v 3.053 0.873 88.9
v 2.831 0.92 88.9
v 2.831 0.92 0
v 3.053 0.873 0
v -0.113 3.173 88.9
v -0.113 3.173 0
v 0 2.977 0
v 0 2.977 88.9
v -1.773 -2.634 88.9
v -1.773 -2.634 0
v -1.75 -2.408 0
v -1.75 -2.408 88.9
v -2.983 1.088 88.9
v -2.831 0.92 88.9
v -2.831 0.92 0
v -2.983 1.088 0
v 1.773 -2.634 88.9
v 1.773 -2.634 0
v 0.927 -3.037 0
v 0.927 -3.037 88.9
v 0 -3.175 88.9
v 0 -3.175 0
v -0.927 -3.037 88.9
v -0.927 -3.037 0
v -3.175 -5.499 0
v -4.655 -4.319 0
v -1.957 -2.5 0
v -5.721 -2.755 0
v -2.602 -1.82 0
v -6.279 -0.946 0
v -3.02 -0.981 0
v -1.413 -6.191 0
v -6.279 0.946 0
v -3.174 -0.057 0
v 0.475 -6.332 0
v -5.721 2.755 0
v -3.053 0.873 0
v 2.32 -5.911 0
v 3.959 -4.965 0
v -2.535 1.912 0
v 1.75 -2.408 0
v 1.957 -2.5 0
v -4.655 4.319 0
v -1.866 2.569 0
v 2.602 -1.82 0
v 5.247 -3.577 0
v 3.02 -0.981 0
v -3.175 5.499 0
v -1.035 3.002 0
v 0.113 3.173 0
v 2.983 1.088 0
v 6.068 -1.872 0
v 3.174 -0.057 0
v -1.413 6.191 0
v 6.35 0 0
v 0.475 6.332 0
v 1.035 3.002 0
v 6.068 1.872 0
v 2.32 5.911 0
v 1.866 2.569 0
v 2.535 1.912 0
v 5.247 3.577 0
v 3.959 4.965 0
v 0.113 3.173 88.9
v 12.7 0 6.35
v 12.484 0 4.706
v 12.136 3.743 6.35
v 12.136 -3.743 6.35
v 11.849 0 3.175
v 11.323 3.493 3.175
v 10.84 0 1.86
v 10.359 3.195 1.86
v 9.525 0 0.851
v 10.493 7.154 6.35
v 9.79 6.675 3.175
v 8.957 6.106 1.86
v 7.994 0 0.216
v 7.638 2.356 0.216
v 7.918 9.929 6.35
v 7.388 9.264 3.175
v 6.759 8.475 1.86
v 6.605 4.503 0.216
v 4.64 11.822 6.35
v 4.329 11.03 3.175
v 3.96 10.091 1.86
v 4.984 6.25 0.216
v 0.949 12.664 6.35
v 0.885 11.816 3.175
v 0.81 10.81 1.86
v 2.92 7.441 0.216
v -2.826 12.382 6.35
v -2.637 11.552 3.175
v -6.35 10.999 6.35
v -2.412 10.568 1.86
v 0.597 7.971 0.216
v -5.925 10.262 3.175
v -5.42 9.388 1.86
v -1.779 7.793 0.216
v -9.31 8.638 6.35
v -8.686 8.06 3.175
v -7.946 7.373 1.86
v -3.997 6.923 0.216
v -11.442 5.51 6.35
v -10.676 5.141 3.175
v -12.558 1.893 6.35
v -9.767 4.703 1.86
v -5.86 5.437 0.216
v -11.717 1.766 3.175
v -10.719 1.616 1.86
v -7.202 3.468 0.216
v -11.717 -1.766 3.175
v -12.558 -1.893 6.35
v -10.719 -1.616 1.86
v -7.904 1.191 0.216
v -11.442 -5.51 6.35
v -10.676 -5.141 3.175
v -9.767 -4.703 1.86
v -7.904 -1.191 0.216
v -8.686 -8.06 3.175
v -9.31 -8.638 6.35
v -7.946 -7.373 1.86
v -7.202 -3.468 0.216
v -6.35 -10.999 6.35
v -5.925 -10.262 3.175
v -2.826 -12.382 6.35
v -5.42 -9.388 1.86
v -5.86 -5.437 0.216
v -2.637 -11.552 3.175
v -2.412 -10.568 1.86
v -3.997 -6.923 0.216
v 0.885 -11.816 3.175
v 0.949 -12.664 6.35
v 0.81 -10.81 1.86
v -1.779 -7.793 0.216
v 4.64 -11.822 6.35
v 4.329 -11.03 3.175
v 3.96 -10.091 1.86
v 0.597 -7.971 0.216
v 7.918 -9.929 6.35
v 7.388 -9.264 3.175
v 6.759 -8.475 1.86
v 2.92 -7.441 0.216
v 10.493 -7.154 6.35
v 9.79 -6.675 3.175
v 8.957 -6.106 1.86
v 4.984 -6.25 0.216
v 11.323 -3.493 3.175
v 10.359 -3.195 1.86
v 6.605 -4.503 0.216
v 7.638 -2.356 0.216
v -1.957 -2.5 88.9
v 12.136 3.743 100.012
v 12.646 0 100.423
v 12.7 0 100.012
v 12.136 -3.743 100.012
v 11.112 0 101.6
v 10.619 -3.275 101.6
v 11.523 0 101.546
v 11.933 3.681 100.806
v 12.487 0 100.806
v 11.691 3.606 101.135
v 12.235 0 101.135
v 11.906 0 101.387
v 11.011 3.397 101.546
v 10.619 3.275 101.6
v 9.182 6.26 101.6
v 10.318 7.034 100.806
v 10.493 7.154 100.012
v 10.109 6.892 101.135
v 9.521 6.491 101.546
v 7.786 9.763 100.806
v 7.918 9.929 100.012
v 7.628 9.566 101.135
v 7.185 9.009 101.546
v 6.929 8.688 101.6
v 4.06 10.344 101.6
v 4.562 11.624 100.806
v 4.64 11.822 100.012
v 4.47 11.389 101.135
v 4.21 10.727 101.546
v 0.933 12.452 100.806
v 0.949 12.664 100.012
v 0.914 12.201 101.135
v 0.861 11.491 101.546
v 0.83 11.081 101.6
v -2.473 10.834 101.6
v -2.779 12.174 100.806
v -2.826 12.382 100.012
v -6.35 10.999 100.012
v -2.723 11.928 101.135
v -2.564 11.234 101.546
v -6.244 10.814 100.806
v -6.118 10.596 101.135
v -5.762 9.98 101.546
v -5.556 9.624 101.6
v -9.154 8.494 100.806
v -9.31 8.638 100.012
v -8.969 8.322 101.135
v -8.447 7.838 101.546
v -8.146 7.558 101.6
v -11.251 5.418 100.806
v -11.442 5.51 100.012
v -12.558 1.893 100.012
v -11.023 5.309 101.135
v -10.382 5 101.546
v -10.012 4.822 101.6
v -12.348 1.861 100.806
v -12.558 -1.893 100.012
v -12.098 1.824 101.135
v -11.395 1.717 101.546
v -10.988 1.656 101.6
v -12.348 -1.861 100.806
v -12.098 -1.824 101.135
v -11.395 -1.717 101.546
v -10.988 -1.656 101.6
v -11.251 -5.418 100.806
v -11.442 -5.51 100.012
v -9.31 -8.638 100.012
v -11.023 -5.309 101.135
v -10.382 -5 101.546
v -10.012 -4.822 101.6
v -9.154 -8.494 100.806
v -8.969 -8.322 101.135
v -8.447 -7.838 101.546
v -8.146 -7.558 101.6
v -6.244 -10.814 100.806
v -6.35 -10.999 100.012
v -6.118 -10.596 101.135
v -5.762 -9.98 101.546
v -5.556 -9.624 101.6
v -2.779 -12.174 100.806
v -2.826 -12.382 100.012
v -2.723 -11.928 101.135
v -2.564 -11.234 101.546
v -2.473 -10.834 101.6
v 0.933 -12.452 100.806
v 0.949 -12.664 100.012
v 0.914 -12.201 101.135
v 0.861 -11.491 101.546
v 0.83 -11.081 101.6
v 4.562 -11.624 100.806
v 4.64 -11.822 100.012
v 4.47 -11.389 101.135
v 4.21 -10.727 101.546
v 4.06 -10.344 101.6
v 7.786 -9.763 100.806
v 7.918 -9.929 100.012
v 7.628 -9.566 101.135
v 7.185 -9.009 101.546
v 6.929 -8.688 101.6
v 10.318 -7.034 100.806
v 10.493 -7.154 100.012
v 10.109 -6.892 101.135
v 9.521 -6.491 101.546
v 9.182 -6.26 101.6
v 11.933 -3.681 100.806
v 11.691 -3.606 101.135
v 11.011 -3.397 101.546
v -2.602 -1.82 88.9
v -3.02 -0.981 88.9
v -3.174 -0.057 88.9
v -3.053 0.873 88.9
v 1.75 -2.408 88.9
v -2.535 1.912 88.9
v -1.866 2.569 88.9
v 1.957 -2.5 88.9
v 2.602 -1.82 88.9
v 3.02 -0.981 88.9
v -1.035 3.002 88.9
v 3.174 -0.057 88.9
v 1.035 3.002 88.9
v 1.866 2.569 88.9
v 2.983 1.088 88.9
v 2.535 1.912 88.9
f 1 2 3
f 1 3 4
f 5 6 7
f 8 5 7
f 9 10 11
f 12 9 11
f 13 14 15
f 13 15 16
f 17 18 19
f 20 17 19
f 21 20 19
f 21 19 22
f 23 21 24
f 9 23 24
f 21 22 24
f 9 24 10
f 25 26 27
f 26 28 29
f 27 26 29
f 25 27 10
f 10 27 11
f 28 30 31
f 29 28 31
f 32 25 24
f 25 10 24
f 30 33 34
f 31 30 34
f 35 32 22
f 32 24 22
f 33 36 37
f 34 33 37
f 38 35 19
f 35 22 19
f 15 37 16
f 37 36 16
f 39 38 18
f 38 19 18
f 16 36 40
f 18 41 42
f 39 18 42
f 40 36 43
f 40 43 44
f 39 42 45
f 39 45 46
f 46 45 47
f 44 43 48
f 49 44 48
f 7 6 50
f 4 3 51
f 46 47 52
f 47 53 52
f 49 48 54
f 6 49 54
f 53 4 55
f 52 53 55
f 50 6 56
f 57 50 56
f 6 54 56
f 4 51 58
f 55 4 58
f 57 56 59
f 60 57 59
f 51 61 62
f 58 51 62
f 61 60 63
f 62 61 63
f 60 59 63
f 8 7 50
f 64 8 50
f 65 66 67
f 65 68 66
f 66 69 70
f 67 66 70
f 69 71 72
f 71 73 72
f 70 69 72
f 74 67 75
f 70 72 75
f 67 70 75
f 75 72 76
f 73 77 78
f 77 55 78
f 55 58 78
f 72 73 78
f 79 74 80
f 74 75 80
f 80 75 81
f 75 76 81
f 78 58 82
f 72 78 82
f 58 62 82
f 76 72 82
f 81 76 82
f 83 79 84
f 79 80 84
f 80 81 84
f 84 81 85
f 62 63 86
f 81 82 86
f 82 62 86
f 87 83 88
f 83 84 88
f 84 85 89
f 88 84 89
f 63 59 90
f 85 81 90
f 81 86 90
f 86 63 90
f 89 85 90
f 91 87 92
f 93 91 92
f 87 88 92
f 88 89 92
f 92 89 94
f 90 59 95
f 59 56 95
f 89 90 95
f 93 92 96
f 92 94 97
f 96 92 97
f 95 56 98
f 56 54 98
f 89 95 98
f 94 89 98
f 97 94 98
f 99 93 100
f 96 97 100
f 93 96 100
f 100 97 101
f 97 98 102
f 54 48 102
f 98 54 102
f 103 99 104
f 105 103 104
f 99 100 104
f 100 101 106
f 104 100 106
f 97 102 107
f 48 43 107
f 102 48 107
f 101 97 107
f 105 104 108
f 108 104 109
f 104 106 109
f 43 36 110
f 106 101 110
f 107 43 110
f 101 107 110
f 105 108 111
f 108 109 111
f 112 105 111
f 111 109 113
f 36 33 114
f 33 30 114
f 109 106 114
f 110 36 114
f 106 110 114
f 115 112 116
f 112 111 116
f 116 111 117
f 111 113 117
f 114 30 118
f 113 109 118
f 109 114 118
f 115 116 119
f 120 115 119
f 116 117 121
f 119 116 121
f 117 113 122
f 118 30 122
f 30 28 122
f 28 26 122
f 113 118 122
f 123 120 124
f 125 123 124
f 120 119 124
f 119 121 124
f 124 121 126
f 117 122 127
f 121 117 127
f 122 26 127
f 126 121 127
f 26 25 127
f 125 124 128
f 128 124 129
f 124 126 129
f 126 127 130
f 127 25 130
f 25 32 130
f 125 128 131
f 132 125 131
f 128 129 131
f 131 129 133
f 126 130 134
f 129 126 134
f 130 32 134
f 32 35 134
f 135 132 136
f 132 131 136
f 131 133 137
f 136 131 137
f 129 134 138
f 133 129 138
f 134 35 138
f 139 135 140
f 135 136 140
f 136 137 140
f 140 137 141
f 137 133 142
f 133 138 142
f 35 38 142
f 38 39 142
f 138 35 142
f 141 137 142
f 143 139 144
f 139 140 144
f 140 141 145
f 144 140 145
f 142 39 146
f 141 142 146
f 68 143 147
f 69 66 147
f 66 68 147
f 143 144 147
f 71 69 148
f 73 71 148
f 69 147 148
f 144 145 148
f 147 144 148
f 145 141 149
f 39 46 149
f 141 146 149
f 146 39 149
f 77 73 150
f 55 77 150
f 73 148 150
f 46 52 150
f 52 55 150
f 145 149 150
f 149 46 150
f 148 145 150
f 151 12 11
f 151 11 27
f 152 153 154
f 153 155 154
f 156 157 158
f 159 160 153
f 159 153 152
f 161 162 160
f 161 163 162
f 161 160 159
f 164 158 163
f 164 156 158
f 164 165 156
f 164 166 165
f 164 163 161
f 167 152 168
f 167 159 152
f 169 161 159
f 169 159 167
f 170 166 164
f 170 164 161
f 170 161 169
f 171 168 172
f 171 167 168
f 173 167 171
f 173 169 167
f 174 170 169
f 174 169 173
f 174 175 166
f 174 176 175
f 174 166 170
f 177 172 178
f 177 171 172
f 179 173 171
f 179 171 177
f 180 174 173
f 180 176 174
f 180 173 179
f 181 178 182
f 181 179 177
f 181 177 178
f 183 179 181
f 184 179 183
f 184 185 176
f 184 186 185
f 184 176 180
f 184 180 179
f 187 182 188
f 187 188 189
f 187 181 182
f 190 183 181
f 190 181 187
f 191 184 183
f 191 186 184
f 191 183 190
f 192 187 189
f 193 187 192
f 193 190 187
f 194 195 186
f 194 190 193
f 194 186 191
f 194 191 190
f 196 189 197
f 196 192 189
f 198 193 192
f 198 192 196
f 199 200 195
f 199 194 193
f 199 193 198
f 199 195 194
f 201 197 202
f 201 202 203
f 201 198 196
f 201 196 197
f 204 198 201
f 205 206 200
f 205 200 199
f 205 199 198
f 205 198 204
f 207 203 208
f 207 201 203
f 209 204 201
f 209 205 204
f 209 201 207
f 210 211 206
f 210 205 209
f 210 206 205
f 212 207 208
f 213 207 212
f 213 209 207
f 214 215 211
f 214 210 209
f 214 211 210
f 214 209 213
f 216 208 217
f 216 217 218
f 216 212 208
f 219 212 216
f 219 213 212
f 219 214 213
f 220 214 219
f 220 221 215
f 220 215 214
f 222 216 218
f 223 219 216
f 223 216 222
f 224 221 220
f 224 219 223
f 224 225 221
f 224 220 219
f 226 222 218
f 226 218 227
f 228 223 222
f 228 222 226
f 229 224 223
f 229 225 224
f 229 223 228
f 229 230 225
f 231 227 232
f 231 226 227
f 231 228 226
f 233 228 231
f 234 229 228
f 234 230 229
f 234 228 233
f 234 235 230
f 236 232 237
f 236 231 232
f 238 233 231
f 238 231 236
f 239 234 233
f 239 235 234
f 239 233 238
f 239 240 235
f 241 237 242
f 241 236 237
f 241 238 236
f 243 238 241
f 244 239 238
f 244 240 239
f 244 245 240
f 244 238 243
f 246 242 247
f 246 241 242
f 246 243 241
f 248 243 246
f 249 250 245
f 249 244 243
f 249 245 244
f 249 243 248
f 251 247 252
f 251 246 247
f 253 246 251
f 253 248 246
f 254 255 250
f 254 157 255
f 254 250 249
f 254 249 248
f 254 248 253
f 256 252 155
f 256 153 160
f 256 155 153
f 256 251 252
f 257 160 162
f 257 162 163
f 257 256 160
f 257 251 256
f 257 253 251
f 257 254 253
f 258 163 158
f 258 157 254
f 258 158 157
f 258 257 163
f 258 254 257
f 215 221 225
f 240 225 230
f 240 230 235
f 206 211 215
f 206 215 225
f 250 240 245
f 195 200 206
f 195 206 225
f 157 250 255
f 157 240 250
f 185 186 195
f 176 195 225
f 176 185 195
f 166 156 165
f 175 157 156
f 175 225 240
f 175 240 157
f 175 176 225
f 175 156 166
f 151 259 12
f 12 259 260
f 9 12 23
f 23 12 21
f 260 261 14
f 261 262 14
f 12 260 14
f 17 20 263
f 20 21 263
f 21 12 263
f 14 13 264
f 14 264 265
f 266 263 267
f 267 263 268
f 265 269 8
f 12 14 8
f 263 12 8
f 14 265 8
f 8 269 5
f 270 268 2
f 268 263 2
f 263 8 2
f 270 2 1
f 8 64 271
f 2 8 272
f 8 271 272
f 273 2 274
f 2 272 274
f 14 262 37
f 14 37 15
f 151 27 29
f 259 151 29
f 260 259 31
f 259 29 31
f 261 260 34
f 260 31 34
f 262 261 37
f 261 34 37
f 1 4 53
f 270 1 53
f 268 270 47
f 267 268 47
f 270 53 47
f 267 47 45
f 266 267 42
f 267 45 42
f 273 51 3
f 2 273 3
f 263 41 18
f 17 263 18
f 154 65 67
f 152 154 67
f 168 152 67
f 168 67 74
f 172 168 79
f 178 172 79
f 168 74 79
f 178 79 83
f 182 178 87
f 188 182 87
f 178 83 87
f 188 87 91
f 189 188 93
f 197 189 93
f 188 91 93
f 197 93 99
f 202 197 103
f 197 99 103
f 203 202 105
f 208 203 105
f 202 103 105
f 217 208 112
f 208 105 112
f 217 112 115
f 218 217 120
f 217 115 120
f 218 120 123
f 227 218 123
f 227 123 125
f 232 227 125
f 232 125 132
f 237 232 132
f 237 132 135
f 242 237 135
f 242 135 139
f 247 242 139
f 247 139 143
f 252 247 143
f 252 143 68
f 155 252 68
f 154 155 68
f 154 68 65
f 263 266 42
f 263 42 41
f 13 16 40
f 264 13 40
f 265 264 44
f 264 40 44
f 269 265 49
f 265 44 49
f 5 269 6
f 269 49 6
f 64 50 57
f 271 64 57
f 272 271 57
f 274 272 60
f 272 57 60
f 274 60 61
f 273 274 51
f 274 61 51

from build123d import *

# Parameters (mm, degrees)
F0_R     = 12.7
F1_DEPTH = 88.9
F2_R     = 12.7
F3_DEPTH = 12.7
F4_R     = 1.5875
F5_R     = 6.35


with BuildPart() as f1:
    # F0 (on Top) → F1 (new body)
    with BuildSketch(Plane.XY):
        Circle(F0_R)
        with BuildLine():
            ThreePointArc((-2.9826358368, 1.0883512598), (-1.866218176, 2.5686289571), (-0.1133983961, 3.1729742835))
            Line((-0.1133983961, 3.1729742835), (0, 2.9765625))
            Line((0, 2.9765625), (0.1133983961, 3.1729742835))
            ThreePointArc((0.1133983961, 3.1729742835), (1.866218176, 2.5686289571), (2.9826358368, 1.0883512598))
            Line((2.9826358368, 1.0883512598), (2.8308791618, 0.9198083973))
            Line((2.8308791618, 0.9198083973), (3.0527198999, 0.8726546928))
            ThreePointArc((3.0527198999, 0.8726546928), (3.0196044392, -0.9811289571), (1.9567687193, -2.5003362132))
            Line((1.9567687193, -2.5003362132), (1.74957954, -2.4080896473))
            Line((1.74957954, -2.4080896473), (1.7732862602, -2.6336440229))
            ThreePointArc((1.7732862602, -2.6336440229), (0, -3.175), (-1.7732862602, -2.6336440229))
            Line((-1.7732862602, -2.6336440229), (-1.74957954, -2.4080896473))
            Line((-1.74957954, -2.4080896473), (-1.9567687193, -2.5003362132))
            ThreePointArc((-1.9567687193, -2.5003362132), (-3.0196044392, -0.9811289571), (-3.0527198999, 0.8726546928))
            Line((-3.0527198999, 0.8726546928), (-2.8308791618, 0.9198083973))
            Line((-2.8308791618, 0.9198083973), (-2.9826358368, 1.0883512598))
        make_face(mode=Mode.SUBTRACT)
    extrude(amount=F1_DEPTH)

    # F2 (on face) → F3 (join)
    with BuildSketch(Plane.XY.offset(88.9)):
        Circle(F2_R)
        with BuildLine():
            Line((-2.8308791618, 0.9198083973), (-2.9826358368, 1.0883512598))
            ThreePointArc((-2.9826358368, 1.0883512598), (-1.866218176, 2.5686289571), (-0.1133983961, 3.1729742835))
            Line((-0.1133983961, 3.1729742835), (0, 2.9765625))
            Line((0, 2.9765625), (0.1133983961, 3.1729742835))
            ThreePointArc((0.1133983961, 3.1729742835), (1.866218176, 2.5686289571), (2.9826358368, 1.0883512598))
            Line((2.9826358368, 1.0883512598), (2.8308791618, 0.9198083973))
            Line((2.8308791618, 0.9198083973), (3.0527198999, 0.8726546928))
            ThreePointArc((3.0527198999, 0.8726546928), (3.0196044392, -0.9811289571), (1.9567687193, -2.5003362132))
            Line((1.9567687193, -2.5003362132), (1.74957954, -2.4080896473))
            Line((1.74957954, -2.4080896473), (1.7732862602, -2.6336440229))
            ThreePointArc((1.7732862602, -2.6336440229), (0, -3.175), (-1.7732862602, -2.6336440229))
            Line((-1.7732862602, -2.6336440229), (-1.74957954, -2.4080896473))
            Line((-1.74957954, -2.4080896473), (-1.9567687193, -2.5003362132))
            ThreePointArc((-1.9567687193, -2.5003362132), (-3.0196044392, -0.9811289571), (-3.0527198999, 0.8726546928))
            Line((-3.0527198999, 0.8726546928), (-2.8308791618, 0.9198083973))
        make_face(mode=Mode.SUBTRACT)
        with BuildLine():
            ThreePointArc((-0.1133983961, 3.1729742835), (-1.866218176, 2.5686289571), (-2.9826358368, 1.0883512598))
            Line((-2.9826358368, 1.0883512598), (-2.8308791618, 0.9198083973))
            Line((-2.8308791618, 0.9198083973), (-3.0527198999, 0.8726546928))
            ThreePointArc((-3.0527198999, 0.8726546928), (-3.0196044392, -0.9811289571), (-1.9567687193, -2.5003362132))
            Line((-1.9567687193, -2.5003362132), (-1.74957954, -2.4080896473))
            Line((-1.74957954, -2.4080896473), (-1.7732862602, -2.6336440229))
            ThreePointArc((-1.7732862602, -2.6336440229), (0, -3.175), (1.7732862602, -2.6336440229))
            Line((1.7732862602, -2.6336440229), (1.74957954, -2.4080896473))
            Line((1.74957954, -2.4080896473), (1.9567687193, -2.5003362132))
            ThreePointArc((1.9567687193, -2.5003362132), (3.0196044392, -0.9811289571), (3.0527198999, 0.8726546928))
            Line((3.0527198999, 0.8726546928), (2.8308791618, 0.9198083973))
            Line((2.8308791618, 0.9198083973), (2.9826358368, 1.0883512598))
            ThreePointArc((2.9826358368, 1.0883512598), (1.866218176, 2.5686289571), (0.1133983961, 3.1729742835))
            Line((0.1133983961, 3.1729742835), (0, 2.9765625))
            Line((0, 2.9765625), (-0.1133983961, 3.1729742835))
        make_face()
    extrude(amount=F3_DEPTH)

    # F4
    f4_edges = [f1.edges().sort_by_distance(p)[0] for p in [
        (-12.7, 0, 101.6),
    ]]
    fillet(f4_edges, radius=F4_R)

    # F5
    f5_edges = [f1.edges().sort_by_distance(p)[0] for p in [
        (-12.7, 0, 0),
    ]]
    fillet(f5_edges, radius=F5_R)


solid = f1.part
